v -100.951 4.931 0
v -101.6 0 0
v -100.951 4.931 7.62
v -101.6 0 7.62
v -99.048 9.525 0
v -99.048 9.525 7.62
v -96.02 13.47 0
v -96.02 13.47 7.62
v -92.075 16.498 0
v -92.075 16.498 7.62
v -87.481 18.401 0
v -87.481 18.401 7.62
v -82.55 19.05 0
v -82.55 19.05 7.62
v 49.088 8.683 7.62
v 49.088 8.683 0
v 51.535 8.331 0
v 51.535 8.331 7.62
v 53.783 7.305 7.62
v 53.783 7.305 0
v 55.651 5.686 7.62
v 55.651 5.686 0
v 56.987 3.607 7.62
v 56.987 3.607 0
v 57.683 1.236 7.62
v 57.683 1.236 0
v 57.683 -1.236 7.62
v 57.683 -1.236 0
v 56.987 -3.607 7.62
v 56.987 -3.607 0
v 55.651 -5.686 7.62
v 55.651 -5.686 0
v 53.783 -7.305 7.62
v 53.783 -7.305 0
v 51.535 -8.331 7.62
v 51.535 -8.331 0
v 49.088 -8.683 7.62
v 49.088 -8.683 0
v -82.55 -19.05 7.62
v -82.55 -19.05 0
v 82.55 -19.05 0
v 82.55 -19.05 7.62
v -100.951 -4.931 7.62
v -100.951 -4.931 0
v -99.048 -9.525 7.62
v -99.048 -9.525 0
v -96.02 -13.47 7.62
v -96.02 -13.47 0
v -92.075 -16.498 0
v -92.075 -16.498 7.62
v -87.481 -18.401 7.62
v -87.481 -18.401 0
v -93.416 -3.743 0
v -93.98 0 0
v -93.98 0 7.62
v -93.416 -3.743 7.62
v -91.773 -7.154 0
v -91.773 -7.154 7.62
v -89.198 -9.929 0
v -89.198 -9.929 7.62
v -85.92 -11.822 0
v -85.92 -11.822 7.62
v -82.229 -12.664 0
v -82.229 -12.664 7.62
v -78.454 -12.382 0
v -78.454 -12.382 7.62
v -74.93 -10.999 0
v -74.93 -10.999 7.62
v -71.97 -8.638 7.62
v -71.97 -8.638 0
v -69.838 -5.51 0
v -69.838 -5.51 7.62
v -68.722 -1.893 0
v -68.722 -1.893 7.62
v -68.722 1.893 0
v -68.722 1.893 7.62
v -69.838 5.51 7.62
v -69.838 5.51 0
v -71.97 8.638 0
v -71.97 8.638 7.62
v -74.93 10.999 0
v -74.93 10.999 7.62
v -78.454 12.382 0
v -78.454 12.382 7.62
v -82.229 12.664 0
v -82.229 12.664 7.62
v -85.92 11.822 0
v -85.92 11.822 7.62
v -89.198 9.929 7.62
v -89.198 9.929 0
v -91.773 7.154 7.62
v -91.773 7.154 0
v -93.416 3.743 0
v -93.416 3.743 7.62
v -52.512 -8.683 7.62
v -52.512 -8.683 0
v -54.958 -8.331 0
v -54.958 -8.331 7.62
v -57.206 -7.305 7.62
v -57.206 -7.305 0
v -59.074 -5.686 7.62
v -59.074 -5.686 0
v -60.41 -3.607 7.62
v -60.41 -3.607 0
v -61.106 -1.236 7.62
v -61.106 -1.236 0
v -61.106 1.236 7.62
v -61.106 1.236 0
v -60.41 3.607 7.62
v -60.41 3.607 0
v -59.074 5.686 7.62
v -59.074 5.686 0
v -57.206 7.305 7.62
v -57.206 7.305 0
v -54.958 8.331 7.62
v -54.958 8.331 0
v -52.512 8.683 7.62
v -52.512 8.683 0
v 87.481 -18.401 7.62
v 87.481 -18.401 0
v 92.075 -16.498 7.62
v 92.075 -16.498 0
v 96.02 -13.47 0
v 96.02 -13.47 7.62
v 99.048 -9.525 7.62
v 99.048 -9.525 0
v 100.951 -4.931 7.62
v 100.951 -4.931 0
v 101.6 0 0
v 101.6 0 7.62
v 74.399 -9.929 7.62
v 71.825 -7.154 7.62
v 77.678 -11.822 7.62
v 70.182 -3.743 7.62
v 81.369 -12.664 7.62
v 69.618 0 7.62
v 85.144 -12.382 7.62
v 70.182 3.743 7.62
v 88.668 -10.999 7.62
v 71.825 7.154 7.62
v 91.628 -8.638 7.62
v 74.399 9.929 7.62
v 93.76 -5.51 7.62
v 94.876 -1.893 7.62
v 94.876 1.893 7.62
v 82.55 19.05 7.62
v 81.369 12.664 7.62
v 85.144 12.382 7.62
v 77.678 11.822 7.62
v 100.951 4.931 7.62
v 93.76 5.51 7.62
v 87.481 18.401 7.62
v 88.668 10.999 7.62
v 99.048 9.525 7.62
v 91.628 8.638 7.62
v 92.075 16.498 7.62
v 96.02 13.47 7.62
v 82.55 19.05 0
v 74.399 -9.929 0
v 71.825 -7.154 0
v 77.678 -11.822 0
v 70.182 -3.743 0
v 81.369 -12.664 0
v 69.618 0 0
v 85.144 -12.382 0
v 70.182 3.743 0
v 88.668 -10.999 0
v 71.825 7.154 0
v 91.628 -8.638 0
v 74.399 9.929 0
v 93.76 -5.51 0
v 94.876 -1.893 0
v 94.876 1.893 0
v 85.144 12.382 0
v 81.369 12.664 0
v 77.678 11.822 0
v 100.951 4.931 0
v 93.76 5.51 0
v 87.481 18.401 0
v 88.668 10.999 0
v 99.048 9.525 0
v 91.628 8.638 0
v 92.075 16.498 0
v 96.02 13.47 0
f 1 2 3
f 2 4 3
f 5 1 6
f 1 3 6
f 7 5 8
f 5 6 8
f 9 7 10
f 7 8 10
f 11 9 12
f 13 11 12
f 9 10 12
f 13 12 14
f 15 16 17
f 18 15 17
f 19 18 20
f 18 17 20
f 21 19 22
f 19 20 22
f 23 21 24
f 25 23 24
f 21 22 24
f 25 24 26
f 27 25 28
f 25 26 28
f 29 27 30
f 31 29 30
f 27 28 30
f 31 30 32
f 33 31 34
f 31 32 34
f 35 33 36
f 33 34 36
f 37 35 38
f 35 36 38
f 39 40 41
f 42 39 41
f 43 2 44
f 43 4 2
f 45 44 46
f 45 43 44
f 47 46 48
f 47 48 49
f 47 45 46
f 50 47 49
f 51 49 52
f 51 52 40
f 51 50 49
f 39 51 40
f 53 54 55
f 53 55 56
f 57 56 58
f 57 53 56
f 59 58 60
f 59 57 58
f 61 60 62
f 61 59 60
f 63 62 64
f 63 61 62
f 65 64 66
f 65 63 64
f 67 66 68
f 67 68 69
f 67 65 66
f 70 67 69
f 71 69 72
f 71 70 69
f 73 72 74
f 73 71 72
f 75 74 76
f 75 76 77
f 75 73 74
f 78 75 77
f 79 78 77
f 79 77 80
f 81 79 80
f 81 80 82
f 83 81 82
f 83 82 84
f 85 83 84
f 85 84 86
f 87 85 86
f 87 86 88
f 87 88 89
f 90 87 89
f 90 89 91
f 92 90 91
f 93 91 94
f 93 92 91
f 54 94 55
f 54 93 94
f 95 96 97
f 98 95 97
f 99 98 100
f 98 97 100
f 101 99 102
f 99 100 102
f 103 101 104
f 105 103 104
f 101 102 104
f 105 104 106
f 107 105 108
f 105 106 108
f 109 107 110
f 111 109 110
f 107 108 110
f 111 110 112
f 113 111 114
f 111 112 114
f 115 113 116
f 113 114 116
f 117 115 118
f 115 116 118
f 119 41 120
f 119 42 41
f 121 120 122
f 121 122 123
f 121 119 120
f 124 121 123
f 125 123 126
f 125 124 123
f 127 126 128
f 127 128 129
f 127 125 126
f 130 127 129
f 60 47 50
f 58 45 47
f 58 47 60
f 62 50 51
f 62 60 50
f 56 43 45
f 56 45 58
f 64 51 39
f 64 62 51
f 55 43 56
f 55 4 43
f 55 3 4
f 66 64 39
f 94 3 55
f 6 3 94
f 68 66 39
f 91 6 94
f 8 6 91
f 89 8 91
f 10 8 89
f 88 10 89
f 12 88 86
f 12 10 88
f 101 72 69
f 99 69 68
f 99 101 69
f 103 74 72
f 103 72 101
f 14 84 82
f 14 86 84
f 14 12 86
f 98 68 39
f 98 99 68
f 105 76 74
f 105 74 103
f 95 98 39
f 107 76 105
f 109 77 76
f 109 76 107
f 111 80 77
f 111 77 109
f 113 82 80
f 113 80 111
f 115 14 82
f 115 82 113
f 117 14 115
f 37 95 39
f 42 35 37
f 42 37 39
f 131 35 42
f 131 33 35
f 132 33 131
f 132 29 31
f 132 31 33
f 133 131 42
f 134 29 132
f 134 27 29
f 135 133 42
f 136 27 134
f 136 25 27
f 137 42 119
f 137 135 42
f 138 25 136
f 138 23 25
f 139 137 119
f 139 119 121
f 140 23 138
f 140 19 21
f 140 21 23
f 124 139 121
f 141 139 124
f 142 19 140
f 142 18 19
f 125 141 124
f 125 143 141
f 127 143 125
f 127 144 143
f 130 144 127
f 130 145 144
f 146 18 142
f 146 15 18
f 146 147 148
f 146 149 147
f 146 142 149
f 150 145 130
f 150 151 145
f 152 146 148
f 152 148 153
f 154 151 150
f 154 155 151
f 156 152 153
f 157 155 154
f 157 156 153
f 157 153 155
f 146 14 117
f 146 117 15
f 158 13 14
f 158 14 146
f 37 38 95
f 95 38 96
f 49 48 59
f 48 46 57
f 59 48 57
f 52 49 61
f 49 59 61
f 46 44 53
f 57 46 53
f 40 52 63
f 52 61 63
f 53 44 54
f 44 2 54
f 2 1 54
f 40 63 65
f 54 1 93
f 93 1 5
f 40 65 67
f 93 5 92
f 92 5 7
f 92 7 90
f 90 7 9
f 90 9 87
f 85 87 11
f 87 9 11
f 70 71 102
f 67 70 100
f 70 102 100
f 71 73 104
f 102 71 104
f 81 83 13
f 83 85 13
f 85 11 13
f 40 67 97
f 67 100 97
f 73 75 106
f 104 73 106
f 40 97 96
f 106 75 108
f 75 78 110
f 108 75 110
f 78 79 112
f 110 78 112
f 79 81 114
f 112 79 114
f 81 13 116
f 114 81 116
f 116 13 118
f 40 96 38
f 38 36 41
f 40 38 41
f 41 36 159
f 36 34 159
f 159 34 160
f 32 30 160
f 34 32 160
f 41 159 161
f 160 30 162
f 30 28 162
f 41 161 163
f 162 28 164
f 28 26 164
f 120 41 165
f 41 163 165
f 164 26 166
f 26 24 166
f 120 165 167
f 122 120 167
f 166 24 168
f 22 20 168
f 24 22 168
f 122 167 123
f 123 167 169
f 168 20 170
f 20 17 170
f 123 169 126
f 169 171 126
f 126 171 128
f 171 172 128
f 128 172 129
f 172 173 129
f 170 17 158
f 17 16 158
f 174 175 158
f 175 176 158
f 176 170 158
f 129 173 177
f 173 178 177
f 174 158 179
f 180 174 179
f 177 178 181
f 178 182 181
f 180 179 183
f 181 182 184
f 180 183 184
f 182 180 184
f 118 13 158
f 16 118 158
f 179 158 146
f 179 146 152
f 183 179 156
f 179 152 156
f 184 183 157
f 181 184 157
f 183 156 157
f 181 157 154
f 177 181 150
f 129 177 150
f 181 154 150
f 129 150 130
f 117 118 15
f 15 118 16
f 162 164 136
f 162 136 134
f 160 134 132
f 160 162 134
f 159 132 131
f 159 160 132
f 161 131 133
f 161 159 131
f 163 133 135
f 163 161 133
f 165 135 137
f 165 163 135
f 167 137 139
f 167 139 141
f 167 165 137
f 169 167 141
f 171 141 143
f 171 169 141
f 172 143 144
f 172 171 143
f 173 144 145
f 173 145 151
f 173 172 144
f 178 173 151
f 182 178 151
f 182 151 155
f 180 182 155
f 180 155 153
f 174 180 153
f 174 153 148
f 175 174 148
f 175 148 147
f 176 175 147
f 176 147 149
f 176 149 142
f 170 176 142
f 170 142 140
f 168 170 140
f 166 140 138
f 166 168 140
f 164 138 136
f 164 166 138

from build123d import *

# Parameters (mm, degrees)
SKETCH1_W           = 203.2
SKETCH1_H           = 38.1
SKETCH1_R           = 12.7
BOSS_EXTRUDE1_DEPTH = 7.62
FILLET1_R           = 19.05


with BuildPart() as part:
    # Sketch1 → Boss-Extrude1 (new body)
    with BuildSketch(Plane.XY):
        Rectangle(SKETCH1_W, SKETCH1_H)
        with Locations(Location((-81.28, 0, 0), (0, 0, 180))):
            Circle(SKETCH1_R, mode=Mode.SUBTRACT)
        with Locations(Location((82.317778023, 0, 0), (0, 0, 180))):
            Circle(SKETCH1_R, mode=Mode.SUBTRACT)
        with BuildLine():
            Line((-52.511607643, 8.682983434), (49.088392357, 8.682983434))
            ThreePointArc((49.088392357, 8.682983434), (57.771375791, 0), (49.088392357, -8.682983434))
            Line((49.088392357, -8.682983434), (-52.511607643, -8.682983434))
            ThreePointArc((-52.511607643, -8.682983434), (-61.194591077, 0), (-52.511607643, 8.682983434))
        make_face(mode=Mode.SUBTRACT)
    extrude(amount=BOSS_EXTRUDE1_DEPTH)

    # Fillet1
    fillet1_edges = [part.edges().sort_by_distance(p)[0] for p in [
        (101.6, -19.05, 3.81),
        (101.6, 19.05, 3.81),
        (-101.6, -19.05, 3.81),
        (-101.6, 19.05, 3.81),
    ]]
    fillet(fillet1_edges, radius=FILLET1_R - 0.0001)  # a hair under: the kernel refuses the full size


solid = part.part
